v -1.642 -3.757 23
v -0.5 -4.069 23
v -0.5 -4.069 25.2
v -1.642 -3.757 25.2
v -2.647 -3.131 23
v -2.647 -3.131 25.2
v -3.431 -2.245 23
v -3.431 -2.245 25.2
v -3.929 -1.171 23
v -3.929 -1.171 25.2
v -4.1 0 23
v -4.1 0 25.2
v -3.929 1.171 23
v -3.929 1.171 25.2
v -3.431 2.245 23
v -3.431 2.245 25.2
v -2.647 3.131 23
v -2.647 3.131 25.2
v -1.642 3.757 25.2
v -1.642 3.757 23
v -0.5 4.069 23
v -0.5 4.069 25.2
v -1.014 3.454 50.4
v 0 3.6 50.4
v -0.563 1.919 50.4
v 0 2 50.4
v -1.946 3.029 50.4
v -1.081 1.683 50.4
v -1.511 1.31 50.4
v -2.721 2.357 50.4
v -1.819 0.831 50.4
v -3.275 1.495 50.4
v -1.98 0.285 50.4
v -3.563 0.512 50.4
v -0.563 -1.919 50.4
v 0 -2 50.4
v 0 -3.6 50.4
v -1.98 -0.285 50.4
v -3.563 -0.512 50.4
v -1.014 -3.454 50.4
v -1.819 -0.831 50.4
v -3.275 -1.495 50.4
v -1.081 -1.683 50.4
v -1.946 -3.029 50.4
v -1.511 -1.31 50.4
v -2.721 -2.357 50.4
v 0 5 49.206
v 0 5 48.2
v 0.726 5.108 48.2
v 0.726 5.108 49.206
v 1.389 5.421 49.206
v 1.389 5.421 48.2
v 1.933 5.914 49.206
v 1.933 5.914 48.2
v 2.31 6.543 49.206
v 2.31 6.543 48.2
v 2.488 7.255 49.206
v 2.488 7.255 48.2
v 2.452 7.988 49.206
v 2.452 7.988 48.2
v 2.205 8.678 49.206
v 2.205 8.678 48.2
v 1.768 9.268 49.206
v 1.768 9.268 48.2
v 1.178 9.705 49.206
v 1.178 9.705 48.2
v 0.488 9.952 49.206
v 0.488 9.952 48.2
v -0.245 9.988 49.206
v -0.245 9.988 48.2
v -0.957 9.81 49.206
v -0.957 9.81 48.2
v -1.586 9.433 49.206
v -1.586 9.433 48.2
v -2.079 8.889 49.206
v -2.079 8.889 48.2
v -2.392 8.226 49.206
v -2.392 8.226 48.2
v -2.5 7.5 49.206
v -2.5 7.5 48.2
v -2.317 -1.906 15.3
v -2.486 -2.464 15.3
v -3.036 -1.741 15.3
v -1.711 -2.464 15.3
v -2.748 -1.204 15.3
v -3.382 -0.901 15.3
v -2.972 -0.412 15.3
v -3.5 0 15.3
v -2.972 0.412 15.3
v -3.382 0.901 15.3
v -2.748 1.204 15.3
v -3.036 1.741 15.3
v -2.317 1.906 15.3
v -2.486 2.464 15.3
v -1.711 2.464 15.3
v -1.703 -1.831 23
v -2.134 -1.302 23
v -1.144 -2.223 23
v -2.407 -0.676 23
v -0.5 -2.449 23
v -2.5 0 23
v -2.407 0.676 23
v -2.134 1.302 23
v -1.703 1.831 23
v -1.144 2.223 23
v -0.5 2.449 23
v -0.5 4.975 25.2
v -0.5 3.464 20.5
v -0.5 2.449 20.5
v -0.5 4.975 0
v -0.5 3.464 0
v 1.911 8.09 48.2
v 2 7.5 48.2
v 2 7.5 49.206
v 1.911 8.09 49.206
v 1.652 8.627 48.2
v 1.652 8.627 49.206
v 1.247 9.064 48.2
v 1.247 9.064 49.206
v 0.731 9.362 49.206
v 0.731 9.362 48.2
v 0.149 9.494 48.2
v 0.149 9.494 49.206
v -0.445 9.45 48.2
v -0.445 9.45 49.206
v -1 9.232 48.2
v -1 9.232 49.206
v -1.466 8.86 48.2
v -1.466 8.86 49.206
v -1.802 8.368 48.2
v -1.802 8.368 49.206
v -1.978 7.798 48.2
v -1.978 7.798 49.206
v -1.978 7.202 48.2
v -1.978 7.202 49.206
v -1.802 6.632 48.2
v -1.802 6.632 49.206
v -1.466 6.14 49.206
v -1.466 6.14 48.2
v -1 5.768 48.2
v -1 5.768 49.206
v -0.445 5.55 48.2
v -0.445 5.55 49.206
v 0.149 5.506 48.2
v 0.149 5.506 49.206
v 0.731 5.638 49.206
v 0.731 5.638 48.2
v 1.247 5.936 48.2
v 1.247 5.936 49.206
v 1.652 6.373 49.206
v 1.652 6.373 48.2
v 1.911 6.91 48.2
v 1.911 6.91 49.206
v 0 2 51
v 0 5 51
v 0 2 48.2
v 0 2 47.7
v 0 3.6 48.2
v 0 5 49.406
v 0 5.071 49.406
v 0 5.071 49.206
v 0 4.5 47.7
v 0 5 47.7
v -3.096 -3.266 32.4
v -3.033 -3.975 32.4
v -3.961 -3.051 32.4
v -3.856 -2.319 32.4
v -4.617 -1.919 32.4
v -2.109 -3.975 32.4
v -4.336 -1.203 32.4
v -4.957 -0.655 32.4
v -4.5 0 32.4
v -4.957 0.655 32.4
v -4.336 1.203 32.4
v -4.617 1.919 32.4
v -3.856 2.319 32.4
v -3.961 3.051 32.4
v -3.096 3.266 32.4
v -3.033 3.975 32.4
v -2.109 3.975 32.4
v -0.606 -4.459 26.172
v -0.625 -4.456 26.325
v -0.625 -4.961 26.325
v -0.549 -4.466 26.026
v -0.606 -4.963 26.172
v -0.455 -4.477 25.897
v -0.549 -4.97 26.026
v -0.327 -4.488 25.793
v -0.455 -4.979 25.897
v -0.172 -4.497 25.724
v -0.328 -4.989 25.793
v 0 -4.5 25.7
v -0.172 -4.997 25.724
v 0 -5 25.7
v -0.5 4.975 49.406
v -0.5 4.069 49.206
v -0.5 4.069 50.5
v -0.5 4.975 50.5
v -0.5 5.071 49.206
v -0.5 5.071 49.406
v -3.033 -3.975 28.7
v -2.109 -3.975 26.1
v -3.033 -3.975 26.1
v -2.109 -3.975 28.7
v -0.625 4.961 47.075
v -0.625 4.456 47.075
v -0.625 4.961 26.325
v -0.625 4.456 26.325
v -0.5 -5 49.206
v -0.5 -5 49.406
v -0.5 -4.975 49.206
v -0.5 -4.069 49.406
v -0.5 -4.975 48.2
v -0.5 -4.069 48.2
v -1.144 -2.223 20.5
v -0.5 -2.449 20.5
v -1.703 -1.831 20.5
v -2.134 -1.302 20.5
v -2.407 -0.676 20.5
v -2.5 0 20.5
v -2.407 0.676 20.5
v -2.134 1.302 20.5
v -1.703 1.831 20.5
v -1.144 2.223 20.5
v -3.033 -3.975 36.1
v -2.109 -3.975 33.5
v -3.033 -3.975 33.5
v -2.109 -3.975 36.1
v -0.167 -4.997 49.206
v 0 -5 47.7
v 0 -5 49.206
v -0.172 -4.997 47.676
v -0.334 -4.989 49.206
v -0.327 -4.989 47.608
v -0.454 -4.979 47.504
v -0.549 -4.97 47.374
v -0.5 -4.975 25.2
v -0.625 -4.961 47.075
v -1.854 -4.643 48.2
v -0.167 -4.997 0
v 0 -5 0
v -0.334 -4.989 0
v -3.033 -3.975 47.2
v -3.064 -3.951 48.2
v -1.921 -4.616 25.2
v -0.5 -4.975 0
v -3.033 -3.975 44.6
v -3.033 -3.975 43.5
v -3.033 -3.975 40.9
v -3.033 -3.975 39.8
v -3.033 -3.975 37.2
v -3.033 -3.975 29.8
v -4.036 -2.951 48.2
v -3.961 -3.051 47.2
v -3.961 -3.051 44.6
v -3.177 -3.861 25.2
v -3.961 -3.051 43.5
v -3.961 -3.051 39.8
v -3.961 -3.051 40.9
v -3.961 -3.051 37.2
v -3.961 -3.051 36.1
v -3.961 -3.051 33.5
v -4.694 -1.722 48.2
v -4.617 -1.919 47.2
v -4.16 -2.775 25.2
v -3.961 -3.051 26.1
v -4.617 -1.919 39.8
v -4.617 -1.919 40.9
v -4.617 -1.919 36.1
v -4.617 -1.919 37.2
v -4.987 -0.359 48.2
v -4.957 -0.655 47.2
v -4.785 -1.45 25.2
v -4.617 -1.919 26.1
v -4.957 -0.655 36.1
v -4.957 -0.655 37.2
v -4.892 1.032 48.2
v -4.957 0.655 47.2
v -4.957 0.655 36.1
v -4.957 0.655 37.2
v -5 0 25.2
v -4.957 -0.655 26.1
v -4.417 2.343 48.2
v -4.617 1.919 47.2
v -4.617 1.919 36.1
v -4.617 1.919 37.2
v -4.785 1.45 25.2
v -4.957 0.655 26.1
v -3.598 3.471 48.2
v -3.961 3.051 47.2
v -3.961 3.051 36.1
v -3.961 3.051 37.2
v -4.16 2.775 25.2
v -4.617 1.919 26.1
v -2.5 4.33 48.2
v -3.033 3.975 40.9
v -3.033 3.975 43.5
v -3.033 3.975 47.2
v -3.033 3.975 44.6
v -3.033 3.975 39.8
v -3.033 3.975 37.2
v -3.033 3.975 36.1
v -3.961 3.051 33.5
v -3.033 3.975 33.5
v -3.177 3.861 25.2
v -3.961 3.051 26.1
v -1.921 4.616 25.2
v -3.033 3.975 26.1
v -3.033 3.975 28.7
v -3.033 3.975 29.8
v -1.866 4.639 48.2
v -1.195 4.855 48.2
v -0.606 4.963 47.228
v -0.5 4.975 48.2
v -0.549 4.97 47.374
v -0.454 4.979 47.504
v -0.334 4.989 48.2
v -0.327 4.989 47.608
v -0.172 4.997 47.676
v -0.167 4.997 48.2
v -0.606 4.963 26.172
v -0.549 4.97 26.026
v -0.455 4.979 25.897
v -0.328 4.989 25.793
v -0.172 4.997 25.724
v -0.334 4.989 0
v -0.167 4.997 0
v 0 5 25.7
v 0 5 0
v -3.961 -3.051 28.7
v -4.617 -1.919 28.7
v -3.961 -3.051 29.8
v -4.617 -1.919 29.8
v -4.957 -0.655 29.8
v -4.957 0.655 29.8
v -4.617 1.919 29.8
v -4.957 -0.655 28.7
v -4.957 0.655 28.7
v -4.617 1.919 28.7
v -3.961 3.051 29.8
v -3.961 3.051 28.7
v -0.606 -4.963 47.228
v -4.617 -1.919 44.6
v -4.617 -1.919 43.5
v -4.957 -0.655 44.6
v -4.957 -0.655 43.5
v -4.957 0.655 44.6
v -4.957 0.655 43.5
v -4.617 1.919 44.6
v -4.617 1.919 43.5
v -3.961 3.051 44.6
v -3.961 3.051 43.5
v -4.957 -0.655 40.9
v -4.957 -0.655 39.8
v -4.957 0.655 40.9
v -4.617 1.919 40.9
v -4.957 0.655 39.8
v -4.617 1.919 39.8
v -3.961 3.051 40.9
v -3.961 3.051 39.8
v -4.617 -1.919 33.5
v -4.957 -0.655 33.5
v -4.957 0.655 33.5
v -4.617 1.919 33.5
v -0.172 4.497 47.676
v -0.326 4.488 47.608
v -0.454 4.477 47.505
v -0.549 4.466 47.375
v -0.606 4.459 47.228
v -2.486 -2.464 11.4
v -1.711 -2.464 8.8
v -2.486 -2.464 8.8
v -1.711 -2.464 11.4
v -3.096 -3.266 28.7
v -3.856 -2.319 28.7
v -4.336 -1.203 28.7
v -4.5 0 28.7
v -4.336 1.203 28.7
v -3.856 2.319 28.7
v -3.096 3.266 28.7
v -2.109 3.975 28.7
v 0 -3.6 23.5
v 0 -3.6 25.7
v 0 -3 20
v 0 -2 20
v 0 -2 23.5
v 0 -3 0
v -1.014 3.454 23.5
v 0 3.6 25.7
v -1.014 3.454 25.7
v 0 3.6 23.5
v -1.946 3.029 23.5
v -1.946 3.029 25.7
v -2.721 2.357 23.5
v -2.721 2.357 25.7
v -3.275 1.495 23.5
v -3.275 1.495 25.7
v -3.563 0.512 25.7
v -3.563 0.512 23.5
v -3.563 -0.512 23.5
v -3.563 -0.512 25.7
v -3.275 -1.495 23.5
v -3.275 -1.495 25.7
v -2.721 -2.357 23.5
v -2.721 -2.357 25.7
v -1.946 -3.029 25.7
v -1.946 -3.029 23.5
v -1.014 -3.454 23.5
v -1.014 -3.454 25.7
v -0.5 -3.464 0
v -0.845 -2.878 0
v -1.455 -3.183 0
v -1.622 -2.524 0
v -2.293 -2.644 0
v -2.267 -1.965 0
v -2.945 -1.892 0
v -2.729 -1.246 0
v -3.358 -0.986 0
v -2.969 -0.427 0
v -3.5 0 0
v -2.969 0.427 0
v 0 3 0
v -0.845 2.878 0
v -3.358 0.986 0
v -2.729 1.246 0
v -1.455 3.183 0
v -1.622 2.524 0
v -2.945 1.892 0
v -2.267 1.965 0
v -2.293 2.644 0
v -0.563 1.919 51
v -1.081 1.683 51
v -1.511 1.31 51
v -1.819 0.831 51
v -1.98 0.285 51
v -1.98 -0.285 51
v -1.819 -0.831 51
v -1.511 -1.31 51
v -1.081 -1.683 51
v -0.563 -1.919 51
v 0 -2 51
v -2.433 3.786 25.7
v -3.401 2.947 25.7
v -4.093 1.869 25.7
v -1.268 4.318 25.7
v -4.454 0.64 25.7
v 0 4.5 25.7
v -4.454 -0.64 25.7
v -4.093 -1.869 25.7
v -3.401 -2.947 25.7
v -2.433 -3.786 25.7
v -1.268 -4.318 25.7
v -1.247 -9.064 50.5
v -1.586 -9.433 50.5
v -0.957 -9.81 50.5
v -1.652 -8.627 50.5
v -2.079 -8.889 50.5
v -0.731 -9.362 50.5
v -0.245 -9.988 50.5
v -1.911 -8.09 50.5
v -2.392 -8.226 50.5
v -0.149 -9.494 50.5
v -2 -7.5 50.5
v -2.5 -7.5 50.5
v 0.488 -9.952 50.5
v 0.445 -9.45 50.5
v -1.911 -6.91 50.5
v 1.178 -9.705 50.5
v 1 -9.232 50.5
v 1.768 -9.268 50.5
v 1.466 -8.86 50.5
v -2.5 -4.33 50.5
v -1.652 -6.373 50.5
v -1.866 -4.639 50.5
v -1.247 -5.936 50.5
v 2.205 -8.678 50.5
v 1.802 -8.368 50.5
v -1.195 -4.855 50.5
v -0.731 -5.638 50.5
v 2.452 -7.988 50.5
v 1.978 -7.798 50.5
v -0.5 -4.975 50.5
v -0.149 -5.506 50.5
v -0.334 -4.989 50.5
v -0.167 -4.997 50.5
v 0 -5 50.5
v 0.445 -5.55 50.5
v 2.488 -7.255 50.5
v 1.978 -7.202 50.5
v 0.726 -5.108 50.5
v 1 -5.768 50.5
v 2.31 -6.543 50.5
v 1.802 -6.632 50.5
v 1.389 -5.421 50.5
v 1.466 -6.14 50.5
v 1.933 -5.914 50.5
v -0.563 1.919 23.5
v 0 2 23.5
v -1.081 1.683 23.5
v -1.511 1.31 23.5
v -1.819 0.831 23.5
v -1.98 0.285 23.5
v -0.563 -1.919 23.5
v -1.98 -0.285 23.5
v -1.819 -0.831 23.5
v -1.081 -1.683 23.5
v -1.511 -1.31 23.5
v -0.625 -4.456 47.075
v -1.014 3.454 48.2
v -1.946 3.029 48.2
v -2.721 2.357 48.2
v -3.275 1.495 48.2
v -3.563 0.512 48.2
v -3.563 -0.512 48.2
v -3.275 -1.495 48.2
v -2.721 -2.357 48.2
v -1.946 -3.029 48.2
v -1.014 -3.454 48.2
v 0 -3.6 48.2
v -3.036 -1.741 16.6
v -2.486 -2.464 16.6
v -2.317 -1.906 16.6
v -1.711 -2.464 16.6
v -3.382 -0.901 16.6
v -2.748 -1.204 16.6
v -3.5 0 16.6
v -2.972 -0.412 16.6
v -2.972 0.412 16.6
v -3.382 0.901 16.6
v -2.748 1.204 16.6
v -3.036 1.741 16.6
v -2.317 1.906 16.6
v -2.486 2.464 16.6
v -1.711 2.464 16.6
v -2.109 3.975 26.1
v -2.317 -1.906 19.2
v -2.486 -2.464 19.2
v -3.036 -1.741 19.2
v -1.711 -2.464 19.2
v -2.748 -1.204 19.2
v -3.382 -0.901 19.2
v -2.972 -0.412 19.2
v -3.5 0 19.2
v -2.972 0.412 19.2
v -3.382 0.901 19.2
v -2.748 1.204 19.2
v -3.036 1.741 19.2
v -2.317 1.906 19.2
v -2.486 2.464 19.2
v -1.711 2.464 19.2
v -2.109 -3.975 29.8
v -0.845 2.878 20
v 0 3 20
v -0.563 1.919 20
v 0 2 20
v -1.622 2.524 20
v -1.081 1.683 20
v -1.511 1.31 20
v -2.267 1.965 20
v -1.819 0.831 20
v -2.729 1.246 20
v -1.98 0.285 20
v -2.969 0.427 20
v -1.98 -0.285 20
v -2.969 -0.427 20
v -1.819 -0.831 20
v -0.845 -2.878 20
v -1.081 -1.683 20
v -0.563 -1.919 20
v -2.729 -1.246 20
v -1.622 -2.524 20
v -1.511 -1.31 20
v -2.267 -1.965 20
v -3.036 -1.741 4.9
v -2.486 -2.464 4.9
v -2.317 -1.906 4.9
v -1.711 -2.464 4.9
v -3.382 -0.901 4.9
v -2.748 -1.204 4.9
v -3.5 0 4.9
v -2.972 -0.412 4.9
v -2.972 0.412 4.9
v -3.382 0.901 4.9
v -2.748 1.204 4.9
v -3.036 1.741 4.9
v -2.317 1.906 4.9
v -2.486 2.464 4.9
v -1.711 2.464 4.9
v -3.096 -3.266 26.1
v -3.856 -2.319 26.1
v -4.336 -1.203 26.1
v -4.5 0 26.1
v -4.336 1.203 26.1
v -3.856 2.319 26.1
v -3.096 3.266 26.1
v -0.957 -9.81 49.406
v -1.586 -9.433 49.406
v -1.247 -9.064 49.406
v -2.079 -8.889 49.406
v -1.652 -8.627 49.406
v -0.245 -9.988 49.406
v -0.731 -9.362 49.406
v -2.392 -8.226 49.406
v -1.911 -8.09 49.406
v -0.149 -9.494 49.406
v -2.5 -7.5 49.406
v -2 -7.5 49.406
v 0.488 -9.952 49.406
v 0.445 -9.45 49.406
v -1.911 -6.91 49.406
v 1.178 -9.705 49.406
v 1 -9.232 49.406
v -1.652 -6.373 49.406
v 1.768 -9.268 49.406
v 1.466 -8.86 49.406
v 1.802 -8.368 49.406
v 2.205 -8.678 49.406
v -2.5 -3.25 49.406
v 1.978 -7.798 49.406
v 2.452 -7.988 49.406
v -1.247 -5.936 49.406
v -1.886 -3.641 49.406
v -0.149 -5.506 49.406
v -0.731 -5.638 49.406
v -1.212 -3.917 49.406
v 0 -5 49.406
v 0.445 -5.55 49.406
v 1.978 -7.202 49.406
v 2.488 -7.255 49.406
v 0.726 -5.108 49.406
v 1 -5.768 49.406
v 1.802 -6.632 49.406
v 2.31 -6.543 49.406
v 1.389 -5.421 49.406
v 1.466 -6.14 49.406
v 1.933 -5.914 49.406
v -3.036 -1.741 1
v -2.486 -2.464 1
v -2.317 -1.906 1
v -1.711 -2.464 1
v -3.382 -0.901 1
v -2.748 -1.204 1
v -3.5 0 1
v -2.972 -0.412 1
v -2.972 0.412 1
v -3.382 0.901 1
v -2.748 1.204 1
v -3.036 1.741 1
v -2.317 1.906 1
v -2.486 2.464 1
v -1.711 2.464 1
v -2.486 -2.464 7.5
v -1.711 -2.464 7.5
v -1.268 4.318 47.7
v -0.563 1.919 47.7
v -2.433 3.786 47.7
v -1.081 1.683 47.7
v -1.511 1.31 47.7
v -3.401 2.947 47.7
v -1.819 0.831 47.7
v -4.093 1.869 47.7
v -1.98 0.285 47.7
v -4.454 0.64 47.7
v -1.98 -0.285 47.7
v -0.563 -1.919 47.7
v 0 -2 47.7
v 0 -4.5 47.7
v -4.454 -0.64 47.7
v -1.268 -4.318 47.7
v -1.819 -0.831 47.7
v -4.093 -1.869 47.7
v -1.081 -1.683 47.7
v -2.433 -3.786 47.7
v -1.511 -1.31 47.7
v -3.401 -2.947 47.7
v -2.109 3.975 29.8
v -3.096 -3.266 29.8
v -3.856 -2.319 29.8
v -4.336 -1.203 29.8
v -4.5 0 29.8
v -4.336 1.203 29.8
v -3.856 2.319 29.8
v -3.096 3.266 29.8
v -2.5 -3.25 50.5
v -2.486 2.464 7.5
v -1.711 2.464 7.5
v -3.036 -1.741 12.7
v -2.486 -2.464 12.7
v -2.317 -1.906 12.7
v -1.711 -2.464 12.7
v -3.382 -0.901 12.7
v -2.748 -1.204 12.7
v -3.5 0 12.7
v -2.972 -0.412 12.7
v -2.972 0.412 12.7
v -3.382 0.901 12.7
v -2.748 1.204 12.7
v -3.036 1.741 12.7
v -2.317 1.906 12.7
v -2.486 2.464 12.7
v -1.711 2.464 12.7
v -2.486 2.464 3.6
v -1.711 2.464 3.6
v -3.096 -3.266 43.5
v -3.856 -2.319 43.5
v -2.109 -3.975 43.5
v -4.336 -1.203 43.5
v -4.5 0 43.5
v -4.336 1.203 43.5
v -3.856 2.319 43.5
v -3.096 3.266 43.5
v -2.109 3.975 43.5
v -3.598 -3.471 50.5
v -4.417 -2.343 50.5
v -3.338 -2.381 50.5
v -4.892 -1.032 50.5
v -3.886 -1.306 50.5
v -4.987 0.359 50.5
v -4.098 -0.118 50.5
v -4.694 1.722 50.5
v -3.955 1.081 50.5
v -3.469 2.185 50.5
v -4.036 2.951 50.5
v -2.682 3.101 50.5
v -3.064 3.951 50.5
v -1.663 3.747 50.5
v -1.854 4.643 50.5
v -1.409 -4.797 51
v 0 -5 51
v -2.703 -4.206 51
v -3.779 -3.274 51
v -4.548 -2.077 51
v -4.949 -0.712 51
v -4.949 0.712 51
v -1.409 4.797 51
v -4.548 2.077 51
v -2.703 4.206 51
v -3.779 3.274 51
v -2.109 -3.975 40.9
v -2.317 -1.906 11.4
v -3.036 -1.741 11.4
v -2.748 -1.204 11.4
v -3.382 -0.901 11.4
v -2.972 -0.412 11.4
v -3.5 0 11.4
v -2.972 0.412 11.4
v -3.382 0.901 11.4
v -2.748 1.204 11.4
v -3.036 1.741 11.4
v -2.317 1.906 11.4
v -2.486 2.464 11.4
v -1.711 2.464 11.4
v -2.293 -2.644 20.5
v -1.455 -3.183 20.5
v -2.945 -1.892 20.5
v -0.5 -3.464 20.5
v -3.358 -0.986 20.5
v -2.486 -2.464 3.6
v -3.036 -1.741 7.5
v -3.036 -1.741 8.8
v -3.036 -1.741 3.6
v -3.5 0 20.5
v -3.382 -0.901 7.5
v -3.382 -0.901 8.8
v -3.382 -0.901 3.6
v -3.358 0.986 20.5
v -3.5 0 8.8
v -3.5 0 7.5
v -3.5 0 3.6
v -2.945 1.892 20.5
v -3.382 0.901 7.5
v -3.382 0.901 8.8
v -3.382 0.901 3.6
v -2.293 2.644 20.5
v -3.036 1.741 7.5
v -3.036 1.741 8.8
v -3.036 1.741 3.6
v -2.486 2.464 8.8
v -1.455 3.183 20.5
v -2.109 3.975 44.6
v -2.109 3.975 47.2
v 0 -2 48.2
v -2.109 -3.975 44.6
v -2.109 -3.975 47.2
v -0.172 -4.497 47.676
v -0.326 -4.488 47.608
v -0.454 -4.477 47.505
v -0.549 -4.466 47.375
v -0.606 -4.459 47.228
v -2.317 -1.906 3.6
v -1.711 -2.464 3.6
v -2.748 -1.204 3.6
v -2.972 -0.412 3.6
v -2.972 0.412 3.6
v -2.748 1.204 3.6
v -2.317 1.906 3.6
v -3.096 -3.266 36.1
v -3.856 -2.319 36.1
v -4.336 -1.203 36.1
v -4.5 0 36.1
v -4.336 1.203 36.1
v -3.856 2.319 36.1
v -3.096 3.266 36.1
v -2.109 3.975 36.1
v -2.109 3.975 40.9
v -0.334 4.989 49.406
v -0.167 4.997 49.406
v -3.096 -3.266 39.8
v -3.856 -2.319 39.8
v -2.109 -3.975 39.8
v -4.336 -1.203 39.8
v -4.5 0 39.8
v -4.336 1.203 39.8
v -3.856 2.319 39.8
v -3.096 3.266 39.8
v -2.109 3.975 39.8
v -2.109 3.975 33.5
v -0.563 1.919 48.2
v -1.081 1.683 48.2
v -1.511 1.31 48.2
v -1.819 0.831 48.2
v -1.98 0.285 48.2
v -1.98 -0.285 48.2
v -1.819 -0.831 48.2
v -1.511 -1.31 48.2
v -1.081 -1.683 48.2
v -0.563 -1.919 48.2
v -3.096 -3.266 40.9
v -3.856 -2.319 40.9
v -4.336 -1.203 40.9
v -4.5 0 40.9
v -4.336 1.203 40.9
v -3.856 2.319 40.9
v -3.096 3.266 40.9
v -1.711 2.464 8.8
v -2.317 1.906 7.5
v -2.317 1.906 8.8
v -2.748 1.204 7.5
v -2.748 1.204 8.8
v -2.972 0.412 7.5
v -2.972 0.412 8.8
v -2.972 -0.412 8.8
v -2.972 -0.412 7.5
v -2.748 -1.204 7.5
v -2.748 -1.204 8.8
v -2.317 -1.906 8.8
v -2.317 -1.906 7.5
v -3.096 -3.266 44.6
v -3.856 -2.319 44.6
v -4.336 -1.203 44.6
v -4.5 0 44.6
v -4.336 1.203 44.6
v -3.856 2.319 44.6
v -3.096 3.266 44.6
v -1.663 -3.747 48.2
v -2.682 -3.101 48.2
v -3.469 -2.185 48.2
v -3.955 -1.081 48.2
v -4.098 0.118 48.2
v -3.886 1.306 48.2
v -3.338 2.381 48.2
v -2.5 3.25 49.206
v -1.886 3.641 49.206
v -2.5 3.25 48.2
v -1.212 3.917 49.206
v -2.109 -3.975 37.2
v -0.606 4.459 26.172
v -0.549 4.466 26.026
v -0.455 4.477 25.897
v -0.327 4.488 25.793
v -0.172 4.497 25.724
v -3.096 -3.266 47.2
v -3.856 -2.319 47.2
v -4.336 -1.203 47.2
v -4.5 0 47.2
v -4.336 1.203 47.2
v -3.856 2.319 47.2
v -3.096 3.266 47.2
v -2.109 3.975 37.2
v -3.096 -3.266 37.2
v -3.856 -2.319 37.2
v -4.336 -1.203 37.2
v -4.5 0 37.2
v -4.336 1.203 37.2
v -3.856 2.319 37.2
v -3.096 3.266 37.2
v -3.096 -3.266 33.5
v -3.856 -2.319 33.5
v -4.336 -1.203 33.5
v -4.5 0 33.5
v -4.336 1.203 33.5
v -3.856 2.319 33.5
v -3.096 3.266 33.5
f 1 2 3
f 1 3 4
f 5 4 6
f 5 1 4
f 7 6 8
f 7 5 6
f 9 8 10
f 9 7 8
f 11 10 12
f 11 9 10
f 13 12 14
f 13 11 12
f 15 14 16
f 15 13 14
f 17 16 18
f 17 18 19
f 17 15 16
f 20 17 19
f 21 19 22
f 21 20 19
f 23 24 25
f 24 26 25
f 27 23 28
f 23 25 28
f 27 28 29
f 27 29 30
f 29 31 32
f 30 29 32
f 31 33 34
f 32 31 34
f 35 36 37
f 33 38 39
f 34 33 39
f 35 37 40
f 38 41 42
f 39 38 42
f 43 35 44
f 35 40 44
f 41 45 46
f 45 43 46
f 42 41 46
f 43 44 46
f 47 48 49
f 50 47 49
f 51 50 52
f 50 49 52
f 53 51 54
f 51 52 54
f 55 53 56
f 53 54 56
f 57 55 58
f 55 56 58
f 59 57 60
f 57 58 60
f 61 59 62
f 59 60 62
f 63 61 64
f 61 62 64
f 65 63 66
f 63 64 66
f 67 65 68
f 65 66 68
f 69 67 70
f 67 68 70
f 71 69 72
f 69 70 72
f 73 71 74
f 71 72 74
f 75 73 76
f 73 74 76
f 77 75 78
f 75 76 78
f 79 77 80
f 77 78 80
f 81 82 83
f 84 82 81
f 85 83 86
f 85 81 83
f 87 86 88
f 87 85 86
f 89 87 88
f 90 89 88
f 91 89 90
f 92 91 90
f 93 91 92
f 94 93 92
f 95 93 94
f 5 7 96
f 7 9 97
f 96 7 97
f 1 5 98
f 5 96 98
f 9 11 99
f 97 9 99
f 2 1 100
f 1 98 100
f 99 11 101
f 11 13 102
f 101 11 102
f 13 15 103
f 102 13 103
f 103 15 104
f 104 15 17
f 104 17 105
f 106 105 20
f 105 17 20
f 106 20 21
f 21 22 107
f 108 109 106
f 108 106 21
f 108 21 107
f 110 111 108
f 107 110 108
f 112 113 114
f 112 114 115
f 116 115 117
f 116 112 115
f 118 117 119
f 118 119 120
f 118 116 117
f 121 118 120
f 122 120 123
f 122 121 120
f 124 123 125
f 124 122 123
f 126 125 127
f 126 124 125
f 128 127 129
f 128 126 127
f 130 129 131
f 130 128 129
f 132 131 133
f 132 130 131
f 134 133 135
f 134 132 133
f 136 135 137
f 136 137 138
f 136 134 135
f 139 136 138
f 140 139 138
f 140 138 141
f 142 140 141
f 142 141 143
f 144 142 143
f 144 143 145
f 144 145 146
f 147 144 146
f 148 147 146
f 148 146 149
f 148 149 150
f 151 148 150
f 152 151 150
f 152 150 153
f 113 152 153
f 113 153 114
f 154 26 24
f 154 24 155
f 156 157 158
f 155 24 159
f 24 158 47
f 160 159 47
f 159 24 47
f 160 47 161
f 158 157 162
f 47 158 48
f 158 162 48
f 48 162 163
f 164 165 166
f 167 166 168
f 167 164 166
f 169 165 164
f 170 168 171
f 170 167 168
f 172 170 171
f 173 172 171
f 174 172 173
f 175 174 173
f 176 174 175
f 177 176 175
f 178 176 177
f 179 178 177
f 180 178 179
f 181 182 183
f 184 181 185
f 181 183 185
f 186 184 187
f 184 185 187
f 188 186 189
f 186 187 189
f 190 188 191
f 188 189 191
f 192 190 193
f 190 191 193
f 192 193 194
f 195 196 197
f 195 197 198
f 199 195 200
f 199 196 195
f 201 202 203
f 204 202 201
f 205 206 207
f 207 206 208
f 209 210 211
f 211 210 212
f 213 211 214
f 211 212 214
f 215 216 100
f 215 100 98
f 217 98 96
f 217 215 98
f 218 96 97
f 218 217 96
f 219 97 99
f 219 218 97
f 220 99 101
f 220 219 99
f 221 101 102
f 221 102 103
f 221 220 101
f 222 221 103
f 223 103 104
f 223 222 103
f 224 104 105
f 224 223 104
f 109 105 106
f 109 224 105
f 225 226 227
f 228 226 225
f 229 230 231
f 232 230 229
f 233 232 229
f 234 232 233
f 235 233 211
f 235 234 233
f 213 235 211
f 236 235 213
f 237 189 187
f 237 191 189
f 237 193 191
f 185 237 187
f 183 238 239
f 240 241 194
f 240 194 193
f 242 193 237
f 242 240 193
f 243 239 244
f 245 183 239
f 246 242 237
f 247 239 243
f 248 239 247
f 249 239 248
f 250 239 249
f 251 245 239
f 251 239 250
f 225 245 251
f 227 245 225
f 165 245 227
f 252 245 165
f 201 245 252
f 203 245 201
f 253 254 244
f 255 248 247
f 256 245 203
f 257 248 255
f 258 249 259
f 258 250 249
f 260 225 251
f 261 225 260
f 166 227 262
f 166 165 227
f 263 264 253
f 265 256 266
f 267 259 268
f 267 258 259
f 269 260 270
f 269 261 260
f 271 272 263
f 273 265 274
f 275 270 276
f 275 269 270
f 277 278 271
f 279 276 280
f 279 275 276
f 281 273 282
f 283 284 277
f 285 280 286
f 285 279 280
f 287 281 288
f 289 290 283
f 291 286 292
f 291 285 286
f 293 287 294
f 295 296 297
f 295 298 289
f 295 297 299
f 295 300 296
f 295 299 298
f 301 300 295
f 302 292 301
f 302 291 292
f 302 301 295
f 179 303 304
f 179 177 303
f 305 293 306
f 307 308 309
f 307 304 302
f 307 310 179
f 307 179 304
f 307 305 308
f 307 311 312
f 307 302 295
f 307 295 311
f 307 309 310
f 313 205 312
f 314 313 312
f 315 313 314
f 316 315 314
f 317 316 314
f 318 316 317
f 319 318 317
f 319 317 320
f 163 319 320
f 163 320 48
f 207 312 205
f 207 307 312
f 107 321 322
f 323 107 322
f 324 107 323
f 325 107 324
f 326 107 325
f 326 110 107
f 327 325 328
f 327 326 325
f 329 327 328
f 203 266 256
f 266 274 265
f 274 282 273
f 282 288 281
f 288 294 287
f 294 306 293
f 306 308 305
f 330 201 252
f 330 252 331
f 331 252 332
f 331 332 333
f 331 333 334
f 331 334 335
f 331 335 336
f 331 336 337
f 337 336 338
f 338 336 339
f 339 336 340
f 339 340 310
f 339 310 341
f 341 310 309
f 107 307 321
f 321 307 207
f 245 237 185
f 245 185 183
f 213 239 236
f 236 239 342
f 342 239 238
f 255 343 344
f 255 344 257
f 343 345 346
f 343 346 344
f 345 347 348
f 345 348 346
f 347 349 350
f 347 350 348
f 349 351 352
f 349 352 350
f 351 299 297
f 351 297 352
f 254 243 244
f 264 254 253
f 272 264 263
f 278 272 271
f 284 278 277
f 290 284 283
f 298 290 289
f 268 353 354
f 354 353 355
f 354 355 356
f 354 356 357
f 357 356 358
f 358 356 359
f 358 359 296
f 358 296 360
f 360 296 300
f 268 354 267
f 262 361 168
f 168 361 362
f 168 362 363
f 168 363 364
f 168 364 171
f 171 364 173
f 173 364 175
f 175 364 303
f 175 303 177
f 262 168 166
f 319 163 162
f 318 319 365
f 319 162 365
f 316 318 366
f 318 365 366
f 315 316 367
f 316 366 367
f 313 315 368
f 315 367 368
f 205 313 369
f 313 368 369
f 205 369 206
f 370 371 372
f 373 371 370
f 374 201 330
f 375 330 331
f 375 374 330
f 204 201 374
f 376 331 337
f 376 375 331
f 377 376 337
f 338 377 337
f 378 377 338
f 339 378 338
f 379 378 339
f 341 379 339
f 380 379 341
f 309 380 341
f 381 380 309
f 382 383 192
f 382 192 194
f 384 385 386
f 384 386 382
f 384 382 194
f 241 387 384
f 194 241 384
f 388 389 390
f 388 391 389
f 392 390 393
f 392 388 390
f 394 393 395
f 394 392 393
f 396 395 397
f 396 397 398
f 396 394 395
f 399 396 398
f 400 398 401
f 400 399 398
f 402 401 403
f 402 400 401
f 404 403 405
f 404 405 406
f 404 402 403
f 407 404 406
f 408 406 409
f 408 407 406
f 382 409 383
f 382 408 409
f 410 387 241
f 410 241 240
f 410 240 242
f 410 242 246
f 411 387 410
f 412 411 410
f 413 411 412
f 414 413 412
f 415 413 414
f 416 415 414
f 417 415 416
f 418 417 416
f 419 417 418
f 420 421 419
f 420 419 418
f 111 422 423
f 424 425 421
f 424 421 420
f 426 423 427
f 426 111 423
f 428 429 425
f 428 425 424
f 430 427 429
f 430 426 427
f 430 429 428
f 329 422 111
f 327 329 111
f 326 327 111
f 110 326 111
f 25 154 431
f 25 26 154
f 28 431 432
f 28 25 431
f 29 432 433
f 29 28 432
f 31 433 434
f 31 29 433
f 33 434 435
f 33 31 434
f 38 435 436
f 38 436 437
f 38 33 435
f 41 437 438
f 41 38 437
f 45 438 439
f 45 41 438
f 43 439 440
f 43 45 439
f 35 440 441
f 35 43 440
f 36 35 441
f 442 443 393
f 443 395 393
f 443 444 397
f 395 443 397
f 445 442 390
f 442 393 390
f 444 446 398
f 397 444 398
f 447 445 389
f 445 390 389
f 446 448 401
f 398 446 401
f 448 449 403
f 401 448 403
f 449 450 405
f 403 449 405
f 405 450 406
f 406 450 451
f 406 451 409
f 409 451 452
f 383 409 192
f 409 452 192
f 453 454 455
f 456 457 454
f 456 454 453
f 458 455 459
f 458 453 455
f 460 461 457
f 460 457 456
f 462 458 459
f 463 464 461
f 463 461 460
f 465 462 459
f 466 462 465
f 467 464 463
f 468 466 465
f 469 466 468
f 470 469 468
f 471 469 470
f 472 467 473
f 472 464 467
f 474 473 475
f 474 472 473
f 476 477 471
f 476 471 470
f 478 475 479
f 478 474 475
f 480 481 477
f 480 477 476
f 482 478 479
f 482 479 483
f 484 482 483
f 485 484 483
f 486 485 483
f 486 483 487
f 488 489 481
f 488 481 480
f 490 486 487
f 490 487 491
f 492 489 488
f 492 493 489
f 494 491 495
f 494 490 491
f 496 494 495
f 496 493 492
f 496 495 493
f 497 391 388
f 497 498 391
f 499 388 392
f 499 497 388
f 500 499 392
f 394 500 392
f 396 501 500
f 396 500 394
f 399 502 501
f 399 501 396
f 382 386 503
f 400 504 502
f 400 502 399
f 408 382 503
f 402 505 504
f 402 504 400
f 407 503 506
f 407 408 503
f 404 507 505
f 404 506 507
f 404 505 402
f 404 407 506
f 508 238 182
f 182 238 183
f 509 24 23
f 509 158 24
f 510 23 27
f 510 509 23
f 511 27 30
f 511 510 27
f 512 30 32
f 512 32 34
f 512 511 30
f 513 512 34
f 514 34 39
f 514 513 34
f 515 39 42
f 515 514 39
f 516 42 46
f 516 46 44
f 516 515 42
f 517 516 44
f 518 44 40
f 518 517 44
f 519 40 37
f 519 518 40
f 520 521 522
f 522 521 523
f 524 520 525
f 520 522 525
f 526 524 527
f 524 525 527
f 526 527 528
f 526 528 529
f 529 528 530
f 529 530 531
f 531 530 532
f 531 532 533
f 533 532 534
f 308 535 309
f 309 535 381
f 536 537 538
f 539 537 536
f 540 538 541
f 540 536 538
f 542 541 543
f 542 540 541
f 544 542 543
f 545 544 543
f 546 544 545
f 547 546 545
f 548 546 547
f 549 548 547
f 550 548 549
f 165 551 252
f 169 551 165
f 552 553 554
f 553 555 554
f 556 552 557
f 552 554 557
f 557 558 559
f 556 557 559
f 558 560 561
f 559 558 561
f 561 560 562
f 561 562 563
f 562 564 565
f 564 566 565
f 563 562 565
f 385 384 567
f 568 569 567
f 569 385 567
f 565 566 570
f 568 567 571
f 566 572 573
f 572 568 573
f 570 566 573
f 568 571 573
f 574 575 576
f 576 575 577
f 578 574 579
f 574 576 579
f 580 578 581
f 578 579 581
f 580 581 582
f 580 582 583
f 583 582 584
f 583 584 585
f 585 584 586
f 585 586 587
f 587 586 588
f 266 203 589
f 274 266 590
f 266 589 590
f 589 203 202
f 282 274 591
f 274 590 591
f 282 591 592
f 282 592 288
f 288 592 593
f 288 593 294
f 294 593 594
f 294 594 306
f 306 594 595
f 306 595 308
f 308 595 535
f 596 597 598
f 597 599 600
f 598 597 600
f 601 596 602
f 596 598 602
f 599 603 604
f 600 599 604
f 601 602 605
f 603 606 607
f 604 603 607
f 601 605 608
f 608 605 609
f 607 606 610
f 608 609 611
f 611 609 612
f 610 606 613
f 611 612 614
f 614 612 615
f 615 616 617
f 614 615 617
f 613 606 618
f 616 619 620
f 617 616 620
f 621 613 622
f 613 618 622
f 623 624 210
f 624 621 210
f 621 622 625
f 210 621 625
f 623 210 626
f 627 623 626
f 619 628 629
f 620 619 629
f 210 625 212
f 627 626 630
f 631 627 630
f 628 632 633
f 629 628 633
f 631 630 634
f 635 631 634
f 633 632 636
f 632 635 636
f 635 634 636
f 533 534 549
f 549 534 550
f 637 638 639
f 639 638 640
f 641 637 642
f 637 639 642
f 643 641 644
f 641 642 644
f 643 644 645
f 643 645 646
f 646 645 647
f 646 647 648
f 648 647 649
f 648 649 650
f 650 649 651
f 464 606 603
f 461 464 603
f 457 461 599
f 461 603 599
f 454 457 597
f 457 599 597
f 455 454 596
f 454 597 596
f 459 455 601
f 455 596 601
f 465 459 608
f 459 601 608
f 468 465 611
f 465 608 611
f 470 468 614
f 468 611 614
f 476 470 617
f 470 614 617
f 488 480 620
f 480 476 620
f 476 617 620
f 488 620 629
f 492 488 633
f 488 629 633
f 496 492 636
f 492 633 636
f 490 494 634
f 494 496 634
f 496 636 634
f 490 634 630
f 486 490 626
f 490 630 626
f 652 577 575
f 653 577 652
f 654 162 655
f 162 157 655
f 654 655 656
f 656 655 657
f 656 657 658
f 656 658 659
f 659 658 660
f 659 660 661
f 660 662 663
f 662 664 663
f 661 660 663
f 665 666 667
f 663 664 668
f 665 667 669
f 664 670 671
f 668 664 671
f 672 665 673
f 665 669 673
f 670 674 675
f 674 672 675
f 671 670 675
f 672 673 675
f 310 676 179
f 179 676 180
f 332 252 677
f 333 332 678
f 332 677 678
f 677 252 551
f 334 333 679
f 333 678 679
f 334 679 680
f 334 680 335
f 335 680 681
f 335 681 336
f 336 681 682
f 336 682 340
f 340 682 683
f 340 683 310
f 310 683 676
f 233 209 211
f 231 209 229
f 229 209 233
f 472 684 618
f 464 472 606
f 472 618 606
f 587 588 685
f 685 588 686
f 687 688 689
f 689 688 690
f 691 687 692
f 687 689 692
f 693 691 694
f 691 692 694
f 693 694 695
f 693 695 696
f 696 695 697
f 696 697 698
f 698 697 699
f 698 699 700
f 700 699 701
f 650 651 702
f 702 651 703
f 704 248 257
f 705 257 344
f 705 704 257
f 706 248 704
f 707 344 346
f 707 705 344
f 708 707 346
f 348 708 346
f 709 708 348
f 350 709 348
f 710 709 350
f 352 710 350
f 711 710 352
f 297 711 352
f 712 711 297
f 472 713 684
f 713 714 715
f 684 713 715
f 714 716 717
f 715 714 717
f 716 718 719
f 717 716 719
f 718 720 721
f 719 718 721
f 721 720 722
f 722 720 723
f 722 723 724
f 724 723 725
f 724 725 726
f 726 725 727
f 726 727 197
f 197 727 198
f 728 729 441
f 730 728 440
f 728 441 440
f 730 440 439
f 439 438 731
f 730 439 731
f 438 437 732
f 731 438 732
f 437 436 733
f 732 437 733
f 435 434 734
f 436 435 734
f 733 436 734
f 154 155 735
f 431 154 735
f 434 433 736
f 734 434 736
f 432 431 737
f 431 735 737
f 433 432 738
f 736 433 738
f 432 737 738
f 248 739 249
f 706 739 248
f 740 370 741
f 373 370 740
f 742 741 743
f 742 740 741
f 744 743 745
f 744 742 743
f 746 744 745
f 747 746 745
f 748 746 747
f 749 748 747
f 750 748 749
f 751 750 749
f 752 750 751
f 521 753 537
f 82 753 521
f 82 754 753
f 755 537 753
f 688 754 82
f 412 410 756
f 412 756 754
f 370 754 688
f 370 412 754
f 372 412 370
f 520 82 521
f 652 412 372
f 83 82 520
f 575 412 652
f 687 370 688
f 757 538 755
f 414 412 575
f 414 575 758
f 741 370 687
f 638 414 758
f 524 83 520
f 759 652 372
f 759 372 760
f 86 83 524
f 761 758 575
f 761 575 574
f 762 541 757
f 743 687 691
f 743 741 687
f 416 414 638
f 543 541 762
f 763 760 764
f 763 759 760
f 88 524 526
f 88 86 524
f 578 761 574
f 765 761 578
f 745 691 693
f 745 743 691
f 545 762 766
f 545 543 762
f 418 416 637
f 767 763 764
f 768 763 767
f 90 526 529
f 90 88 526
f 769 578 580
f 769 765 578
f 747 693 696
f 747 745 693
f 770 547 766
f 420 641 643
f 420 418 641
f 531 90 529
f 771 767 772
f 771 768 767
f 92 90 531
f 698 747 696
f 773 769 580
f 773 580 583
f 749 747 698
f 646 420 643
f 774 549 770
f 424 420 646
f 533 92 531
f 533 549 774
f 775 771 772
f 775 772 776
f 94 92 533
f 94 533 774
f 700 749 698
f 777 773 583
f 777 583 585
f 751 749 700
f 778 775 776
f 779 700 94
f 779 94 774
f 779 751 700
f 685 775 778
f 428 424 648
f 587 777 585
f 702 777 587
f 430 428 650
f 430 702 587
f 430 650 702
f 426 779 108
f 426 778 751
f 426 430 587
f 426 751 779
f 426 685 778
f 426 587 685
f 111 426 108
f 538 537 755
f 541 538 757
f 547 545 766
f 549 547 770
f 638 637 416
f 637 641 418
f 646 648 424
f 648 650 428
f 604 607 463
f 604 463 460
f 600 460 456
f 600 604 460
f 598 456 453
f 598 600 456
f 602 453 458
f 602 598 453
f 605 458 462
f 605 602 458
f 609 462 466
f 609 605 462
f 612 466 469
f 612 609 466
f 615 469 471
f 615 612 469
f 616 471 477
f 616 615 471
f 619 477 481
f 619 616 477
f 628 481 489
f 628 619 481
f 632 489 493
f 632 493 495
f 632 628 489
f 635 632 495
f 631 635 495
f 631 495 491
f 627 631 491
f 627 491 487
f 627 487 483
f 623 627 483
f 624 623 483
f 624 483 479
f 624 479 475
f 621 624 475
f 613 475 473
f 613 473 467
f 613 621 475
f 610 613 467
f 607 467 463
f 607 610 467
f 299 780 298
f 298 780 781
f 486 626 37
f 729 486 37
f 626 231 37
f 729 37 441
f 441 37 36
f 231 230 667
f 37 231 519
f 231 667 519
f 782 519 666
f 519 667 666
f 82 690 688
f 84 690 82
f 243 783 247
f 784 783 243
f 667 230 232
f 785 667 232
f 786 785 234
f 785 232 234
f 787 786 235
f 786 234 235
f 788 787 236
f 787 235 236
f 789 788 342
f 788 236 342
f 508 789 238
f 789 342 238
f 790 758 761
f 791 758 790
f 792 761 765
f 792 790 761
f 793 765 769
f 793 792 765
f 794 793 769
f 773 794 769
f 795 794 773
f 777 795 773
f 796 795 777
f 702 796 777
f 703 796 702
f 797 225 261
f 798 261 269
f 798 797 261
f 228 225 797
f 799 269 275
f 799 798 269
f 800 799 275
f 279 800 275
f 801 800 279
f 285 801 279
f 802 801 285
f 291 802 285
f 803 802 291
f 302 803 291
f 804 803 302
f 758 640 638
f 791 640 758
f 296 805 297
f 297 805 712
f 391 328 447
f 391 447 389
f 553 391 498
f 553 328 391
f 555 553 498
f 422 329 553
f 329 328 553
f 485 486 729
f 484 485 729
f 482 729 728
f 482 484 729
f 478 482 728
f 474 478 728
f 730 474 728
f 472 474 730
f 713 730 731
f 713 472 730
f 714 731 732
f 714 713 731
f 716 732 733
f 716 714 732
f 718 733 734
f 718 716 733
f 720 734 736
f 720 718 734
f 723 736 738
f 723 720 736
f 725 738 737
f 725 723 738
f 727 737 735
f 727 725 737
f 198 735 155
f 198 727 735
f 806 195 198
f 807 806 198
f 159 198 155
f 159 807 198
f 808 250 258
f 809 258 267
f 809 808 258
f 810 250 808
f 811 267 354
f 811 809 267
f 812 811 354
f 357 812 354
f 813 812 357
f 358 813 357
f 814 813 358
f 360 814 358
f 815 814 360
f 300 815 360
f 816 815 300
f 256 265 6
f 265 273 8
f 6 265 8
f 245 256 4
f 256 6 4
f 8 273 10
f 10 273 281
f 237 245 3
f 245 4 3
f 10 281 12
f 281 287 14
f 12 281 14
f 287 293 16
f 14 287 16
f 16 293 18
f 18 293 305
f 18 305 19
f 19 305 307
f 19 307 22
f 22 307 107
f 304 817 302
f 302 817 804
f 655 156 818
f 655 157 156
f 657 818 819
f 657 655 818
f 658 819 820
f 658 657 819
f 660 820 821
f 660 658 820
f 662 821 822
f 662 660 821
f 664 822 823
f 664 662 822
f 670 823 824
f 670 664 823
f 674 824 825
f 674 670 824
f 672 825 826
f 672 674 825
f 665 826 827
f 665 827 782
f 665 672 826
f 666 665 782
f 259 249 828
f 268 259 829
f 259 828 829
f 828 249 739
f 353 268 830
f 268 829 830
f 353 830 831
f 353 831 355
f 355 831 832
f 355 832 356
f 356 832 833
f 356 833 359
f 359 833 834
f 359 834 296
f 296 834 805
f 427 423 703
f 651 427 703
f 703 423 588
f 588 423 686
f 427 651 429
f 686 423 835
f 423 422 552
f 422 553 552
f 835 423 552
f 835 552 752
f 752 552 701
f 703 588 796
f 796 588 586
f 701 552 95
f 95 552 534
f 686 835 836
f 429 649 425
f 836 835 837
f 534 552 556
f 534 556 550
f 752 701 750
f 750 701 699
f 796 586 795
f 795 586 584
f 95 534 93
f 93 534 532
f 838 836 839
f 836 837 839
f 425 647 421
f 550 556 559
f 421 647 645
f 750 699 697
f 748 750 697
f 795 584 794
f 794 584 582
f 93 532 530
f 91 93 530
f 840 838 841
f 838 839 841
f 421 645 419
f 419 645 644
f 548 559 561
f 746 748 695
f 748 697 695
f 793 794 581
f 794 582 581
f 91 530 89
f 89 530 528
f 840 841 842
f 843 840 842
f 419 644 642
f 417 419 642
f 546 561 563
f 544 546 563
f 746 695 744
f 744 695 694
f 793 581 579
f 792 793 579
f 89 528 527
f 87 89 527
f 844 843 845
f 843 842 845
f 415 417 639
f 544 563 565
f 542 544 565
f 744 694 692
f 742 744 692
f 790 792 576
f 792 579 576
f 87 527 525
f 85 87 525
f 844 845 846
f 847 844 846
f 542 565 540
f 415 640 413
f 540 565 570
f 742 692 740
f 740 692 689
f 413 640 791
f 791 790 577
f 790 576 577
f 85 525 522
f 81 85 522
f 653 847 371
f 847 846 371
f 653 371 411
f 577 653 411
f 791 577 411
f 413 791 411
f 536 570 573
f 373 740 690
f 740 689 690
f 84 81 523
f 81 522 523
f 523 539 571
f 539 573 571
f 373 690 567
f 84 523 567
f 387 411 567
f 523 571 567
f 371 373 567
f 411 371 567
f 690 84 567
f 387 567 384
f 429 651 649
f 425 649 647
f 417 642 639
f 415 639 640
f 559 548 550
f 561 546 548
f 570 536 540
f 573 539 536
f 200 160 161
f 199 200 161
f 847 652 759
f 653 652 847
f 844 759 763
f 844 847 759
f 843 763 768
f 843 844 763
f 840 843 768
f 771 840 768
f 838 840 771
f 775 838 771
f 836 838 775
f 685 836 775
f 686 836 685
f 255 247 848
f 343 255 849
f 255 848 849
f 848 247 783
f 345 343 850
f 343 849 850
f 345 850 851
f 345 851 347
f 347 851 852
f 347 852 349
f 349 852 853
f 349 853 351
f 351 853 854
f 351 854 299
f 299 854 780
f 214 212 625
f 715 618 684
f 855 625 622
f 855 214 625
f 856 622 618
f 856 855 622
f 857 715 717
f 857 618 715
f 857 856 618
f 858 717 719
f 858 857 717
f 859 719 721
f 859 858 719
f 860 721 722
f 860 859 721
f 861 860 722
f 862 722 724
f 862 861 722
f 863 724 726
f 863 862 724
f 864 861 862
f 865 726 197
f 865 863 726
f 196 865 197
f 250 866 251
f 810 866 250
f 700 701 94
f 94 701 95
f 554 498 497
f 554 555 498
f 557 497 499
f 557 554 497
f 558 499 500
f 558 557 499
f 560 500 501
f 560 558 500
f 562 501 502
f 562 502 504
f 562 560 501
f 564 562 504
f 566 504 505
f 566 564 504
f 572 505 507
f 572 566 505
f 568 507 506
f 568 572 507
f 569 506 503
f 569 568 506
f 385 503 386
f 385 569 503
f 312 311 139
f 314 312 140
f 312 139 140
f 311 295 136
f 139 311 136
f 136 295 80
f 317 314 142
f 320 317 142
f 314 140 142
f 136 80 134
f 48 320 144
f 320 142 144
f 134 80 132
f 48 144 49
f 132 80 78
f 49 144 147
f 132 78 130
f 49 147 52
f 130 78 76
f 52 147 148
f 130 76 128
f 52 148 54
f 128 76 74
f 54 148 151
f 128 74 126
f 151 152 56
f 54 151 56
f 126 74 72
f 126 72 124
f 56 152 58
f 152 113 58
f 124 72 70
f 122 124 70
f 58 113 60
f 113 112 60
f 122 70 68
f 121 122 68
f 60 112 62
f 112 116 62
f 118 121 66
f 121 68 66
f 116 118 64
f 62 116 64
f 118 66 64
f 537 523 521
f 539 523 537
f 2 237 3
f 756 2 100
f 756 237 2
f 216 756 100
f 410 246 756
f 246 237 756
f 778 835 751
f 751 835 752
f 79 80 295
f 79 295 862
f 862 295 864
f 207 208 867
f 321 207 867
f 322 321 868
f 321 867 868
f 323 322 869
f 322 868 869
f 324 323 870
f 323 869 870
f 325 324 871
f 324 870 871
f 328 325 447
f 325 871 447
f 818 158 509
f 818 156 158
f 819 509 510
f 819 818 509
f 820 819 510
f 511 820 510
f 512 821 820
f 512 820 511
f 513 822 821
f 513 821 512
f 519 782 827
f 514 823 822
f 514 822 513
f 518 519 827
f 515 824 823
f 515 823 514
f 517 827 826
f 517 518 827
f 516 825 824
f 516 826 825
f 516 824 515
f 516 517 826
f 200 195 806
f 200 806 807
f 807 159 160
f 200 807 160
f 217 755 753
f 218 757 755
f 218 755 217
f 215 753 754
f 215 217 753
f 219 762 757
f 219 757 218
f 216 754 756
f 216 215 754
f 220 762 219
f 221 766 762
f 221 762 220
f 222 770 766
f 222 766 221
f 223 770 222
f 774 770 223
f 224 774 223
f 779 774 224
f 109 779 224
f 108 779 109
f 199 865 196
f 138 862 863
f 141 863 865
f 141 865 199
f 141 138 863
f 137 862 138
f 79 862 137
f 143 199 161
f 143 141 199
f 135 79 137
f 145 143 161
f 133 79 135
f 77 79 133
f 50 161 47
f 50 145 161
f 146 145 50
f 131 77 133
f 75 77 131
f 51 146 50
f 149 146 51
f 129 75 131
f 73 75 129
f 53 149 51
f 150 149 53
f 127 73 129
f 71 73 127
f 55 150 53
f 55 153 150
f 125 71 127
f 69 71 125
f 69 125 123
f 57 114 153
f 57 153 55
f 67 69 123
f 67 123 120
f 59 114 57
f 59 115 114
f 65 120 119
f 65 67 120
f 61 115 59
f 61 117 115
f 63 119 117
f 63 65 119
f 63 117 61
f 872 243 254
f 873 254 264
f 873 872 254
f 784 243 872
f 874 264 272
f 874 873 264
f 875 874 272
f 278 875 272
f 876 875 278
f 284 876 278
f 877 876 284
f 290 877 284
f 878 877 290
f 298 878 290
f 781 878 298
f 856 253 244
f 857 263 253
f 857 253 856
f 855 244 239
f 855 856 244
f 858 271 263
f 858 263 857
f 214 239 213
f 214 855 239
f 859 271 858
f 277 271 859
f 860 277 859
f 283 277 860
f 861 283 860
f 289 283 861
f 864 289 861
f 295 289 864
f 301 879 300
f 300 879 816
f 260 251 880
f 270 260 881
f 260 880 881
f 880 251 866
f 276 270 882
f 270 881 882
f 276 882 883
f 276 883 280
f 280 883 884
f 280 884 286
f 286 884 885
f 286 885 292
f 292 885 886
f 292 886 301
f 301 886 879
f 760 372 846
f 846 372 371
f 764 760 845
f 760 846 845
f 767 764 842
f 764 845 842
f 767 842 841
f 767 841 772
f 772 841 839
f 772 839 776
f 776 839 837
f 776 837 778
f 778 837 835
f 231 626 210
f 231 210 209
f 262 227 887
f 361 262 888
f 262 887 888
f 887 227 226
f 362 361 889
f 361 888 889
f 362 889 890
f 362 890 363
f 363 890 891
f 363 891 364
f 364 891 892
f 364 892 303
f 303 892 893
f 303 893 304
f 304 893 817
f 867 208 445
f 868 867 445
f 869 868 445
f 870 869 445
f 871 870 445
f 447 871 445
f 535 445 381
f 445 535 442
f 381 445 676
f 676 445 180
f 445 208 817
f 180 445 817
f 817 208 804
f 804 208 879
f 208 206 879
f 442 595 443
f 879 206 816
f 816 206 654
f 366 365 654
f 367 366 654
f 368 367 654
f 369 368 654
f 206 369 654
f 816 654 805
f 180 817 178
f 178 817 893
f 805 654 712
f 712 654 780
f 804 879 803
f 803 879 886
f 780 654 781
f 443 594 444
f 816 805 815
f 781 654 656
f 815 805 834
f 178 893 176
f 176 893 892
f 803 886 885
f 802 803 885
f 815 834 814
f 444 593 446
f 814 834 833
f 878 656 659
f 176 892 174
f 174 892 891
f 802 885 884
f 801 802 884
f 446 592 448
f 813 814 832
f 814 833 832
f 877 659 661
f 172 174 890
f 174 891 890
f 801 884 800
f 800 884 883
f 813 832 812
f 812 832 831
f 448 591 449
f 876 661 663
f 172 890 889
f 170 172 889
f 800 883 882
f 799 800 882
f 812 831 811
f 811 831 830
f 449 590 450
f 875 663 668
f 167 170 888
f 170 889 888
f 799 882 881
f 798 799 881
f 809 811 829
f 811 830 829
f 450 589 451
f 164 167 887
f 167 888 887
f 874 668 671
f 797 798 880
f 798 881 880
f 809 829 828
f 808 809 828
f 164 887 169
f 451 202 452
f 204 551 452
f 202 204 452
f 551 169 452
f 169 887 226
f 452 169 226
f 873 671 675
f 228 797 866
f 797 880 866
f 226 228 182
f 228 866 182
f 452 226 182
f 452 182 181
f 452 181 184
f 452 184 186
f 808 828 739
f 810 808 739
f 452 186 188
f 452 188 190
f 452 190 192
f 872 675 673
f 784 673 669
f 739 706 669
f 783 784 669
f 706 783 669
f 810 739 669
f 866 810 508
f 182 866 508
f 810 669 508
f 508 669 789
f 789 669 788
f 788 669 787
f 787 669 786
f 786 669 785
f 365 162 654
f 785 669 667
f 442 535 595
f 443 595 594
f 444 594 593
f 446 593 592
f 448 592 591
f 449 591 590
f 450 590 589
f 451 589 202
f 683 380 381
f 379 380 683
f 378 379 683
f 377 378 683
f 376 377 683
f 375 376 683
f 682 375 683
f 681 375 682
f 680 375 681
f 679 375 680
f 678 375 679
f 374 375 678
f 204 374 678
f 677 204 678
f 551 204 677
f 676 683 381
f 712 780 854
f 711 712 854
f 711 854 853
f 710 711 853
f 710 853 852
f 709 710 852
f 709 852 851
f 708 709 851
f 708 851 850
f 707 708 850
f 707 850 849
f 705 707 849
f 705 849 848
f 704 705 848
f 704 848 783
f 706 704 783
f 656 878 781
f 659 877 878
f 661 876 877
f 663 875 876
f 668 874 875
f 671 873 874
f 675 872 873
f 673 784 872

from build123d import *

# Parameters (mm, degrees)
BOSS_EXTRUDE2_DEPTH     = 51
SKETCH4_W               = 2
SKETCH4_H               = 3.5
SKETCH4_W_2             = 1.6
SKETCH4_H_2             = 2.2
SKETCH4_H_3             = 22
SKETCH4_H_4             = 0.5
SKETCH4_H_5             = 0.6
CUT_EXTRUDE1_DEPTH      = 52.487862647
CUT_EXTRUDE1_DEPTH_BACK = 52.487862647
SHELL1_DEPTH            = 23
SHELL1_START            = 48.2
SHELL1_2_DEPTH          = 2.3
SHELL1_START_2          = 23
SHELL1_3_DEPTH          = 2.2
SHELL1_START_3          = 20.5
SHELL1_4_DEPTH          = 2.5
CUT_EXTRUDE2_DEPTH      = 52.487862766
CUT_EXTRUDE2_DEPTH_BACK = 52.487862766
SKETCH11_3_W            = 2.6
SKETCH11_3_H            = 7.949874372
SKETCH11_3_H_2          = 4.92820323
BOSS_EXTRUDE3_START     = -1.206049
SKETCH13_R              = 2.5
SKETCH13_R_2            = 2
BOSS_EXTRUDE3_DEPTH     = 1.206049
SKETCH13_3_R            = 2.5
SKETCH13_3_R_2          = 2
BOSS_EXTRUDE4_DEPTH     = 1.093951
CUT_EXTRUDE3_START      = -0.2
SKETCH13_6_R            = 2.5
SKETCH13_6_R_2          = 2
CUT_EXTRUDE3_DEPTH      = 0.2
CUT_EXTRUDE4_START      = -0.2
SKETCH13_7_R            = 2.5
SKETCH13_7_R_2          = 2
CUT_EXTRUDE4_DEPTH      = 0.2
SKETCH16_W              = 0.218836676
SKETCH16_H              = 0.970663166
SKETCH16_W_2            = 0.2
SKETCH16_H_2            = 1.122183611
BOSS_EXTRUDE10_DEPTH    = 0.5


# Read off the part's stored shape, not the designer's step: Shell1
with BuildPart() as part:
    # Sketch1 → Boss-Extrude2 (new body)
    with BuildSketch(Plane.XY):
        with BuildLine():
            Line((0, 5), (0, -5))
            ThreePointArc((0, -5), (-5, 0), (0, 5))
        make_face()
    extrude(amount=BOSS_EXTRUDE2_DEPTH)

    # Sketch4 → Cut-Revolve1 (revolve, cut)
    with BuildSketch(Plane(origin=(0, 0, 0), x_dir=(1, 0, 0), z_dir=(0, 1, 0))):
        Polygon((-3, 0), (-3, -20), (-2, -20), (0, -20), (0, 0), align=None)
        with Locations((-1, -21.75)):
            Rectangle(SKETCH4_W, SKETCH4_H)
        with Locations((-2.8, -24.6)):
            Rectangle(SKETCH4_W_2, SKETCH4_H_2)
        with Locations((-1, -24.6)):
            Rectangle(SKETCH4_W, SKETCH4_H_2)
        Polygon((-2, -47.7), (-2, -25.7), (-3.6, -25.7), (-4.5, -25.7), (-4.5, -47.7), align=None)
        with Locations((-1, -36.7)):
            Rectangle(SKETCH4_W, SKETCH4_H_3)
        with Locations((-1, -47.95)):
            Rectangle(SKETCH4_W, SKETCH4_H_4)
        with Locations((-2.8, -49.3)):
            Rectangle(SKETCH4_W_2, SKETCH4_H_2)
        with Locations((-1, -49.3)):
            Rectangle(SKETCH4_W, SKETCH4_H_2)
        with Locations((-1, -50.7)):
            Rectangle(SKETCH4_W, SKETCH4_H_5)
    revolve(axis=Axis((0, 0, 0), (0, 0, 1)), mode=Mode.SUBTRACT)

    # Sketch5 → Cut-Extrude1 (cut, two sides: drawn at the far end of the back side and taken through both)
    with BuildSketch(Plane(origin=(0, 0, 0), x_dir=(1, 0, 0), z_dir=(0, 1, 0)).offset(-CUT_EXTRUDE1_DEPTH_BACK)):
        with BuildLine():
            Line((0.625, -26.325), (0.625, -47.075))
            ThreePointArc((0.625, -47.075), (0, -47.7), (-0.625, -47.075))
            Line((-0.625, -47.075), (-0.625, -26.325))
            ThreePointArc((-0.625, -26.325), (0, -25.7), (0.625, -26.325))
        make_face()
    extrude(amount=CUT_EXTRUDE1_DEPTH + CUT_EXTRUDE1_DEPTH_BACK, mode=Mode.SUBTRACT)

    # Shell1 outline → Shell1 (cut)
    with BuildSketch(Plane.XY):
        with BuildLine():
            ThreePointArc((-0.5, -3.464101615), (-3.5, 0), (-0.5, 3.464101615))
            Line((-0.5, 3.464101615), (-0.5, 4.974937186))
            ThreePointArc((-0.5, 4.974937186), (-5, 0), (-0.5, -4.974937186))
            Line((-0.5, -4.974937186), (-0.5, -3.464101615))
        make_face()
    extrude(amount=SHELL1_DEPTH, mode=Mode.SUBTRACT)

    # Shell1 2 outline → Shell1 2 (cut)
    with BuildSketch(Plane.XY.offset(SHELL1_START)):
        with BuildLine():
            Line((-0.5, -4.974937186), (-0.5, -4.06939799))
            ThreePointArc((-0.5, -4.06939799), (-4.1, 0), (-0.5, 4.06939799))
            Line((-0.5, 4.06939799), (-0.5, 4.974937186))
            ThreePointArc((-0.5, 4.974937186), (-5, 0), (-0.5, -4.974937186))
        make_face()
    extrude(amount=SHELL1_2_DEPTH, mode=Mode.SUBTRACT)

    # Shell1 3 outline → Shell1 3 (cut)
    with BuildSketch(Plane.XY.offset(SHELL1_START_2)):
        with BuildLine():
            Line((-0.5, -4.974937186), (-0.5, -4.06939799))
            ThreePointArc((-0.5, -4.06939799), (-4.1, 0), (-0.5, 4.06939799))
            Line((-0.5, 4.06939799), (-0.5, 4.974937186))
            ThreePointArc((-0.5, 4.974937186), (-5, 0), (-0.5, -4.974937186))
        make_face()
    extrude(amount=SHELL1_3_DEPTH, mode=Mode.SUBTRACT)

    # Shell1 4 outline → Shell1 4 (cut)
    with BuildSketch(Plane.XY.offset(SHELL1_START_3)):
        with BuildLine():
            Line((-0.5, -3.464101615), (-0.5, -2.449489743))
            ThreePointArc((-0.5, -2.449489743), (-2.5, 0), (-0.5, 2.449489743))
            Line((-0.5, 2.449489743), (-0.5, 3.464101615))
            ThreePointArc((-0.5, 3.464101615), (-3.5, 0), (-0.5, -3.464101615))
        make_face()
    extrude(amount=SHELL1_4_DEPTH, mode=Mode.SUBTRACT)

    # Sketch11<3> → Cut-Extrude2 (cut, two sides: drawn at the far end of the back side and taken through both)
    with BuildSketch(Plane.ZY.offset(5).offset(-CUT_EXTRUDE2_DEPTH_BACK)):
        with Locations((27.4, 0)):
            Rectangle(SKETCH11_3_W, SKETCH11_3_H)
        with Locations((34.8, 0)):
            Rectangle(SKETCH11_3_W, SKETCH11_3_H)
        with Locations((38.5, 0)):
            Rectangle(SKETCH11_3_W, SKETCH11_3_H)
        with Locations((42.2, 0)):
            Rectangle(SKETCH11_3_W, SKETCH11_3_H)
        with Locations((45.9, 0)):
            Rectangle(SKETCH11_3_W, SKETCH11_3_H)
        with Locations((2.3, 0)):
            Rectangle(SKETCH11_3_W, SKETCH11_3_H_2)
        with Locations((6.2, 0)):
            Rectangle(SKETCH11_3_W, SKETCH11_3_H_2)
        with Locations((10.1, 0)):
            Rectangle(SKETCH11_3_W, SKETCH11_3_H_2)
        with Locations((14, 0)):
            Rectangle(SKETCH11_3_W, SKETCH11_3_H_2)
        with Locations((17.9, 0)):
            Rectangle(SKETCH11_3_W, SKETCH11_3_H_2)
        with Locations((31.1, 0)):
            Rectangle(SKETCH11_3_W, SKETCH11_3_H)
    extrude(amount=CUT_EXTRUDE2_DEPTH + CUT_EXTRUDE2_DEPTH_BACK, mode=Mode.SUBTRACT)

    # Sketch13 → Boss-Extrude3 (add)
    # profile 1 of 2: a face of its own
    with BuildSketch(Plane.XY.offset(49.40604876).offset(BOSS_EXTRUDE3_START)):
        with Locations((0, 7.5)):
            Circle(SKETCH13_R)
        with Locations((0, 7.5)):
            Circle(SKETCH13_R_2, mode=Mode.SUBTRACT)
    # profile 2 of 2: a face of its own
    with BuildSketch(Plane.XY.offset(49.40604876).offset(BOSS_EXTRUDE3_START)):
        with BuildLine():
            Line((0, 4.1), (0, 5))
            ThreePointArc((0, 5), (-1.767766953, 5.732233047), (-2.5, 7.5))
            Line((-2.5, 7.5), (-2.5, 3.249615362))
            ThreePointArc((-2.5, 3.249615362), (-1.320336513, 3.881586208), (0, 4.1))
        make_face()
    extrude(amount=BOSS_EXTRUDE3_DEPTH)

    # Sketch13<3> → Boss-Extrude4 (add)
    # profile 1 of 2: a face of its own
    with BuildSketch(Plane.XY.offset(49.40604876)):
        with Locations((0, -7.5)):
            Circle(SKETCH13_3_R)
        with Locations(Location((0, -7.5, 0), (0, 0, 180))):
            Circle(SKETCH13_3_R_2, mode=Mode.SUBTRACT)
    # profile 2 of 2: a face of its own
    with BuildSketch(Plane.XY.offset(49.40604876)):
        with BuildLine():
            ThreePointArc((-2.5, -7.5), (-1.767766953, -5.732233047), (0, -5))
            Line((0, -5), (0, -4.1))
            ThreePointArc((0, -4.1), (-1.320336513, -3.881586208), (-2.5, -3.249615362))
            Line((-2.5, -3.249615362), (-2.5, -7.5))
        make_face()
    extrude(amount=BOSS_EXTRUDE4_DEPTH)

    # Sketch13<6> → Cut-Extrude3 (cut)
    # profile 1 of 2: a face of its own
    with BuildSketch(Plane.XY.offset(49.40604876).offset(CUT_EXTRUDE3_START)):
        with BuildLine():
            Line((0, 4.1), (0, 5))
            ThreePointArc((0, 5), (-1.767766953, 5.732233047), (-2.5, 7.5))
            Line((-2.5, 7.5), (-2.5, 3.249615362))
            ThreePointArc((-2.5, 3.249615362), (-1.320336513, 3.881586208), (0, 4.1))
        make_face()
    # profile 2 of 2: a face of its own
    with BuildSketch(Plane.XY.offset(49.40604876).offset(CUT_EXTRUDE3_START)):
        with Locations((0, 7.5)):
            Circle(SKETCH13_6_R)
        with Locations((0, 7.5)):
            Circle(SKETCH13_6_R_2, mode=Mode.SUBTRACT)
    extrude(amount=CUT_EXTRUDE3_DEPTH, mode=Mode.SUBTRACT)

    # Sketch13<7> → Cut-Extrude4 (cut)
    # profile 1 of 2: a face of its own
    with BuildSketch(Plane.XY.offset(49.40604876).offset(CUT_EXTRUDE4_START)):
        with Locations((0, -7.5)):
            Circle(SKETCH13_7_R)
        with Locations(Location((0, -7.5, 0), (0, 0, 180))):
            Circle(SKETCH13_7_R_2, mode=Mode.SUBTRACT)
    # profile 2 of 2: a face of its own
    with BuildSketch(Plane.XY.offset(49.40604876).offset(CUT_EXTRUDE4_START)):
        with BuildLine():
            ThreePointArc((-2.5, -7.5), (-1.767766953, -5.732233047), (0, -5))
            Line((0, -5), (0, -4.1))
            ThreePointArc((0, -4.1), (-1.320336513, -3.881586208), (-2.5, -3.249615362))
            Line((-2.5, -3.249615362), (-2.5, -7.5))
        make_face()
    extrude(amount=CUT_EXTRUDE4_DEPTH, mode=Mode.SUBTRACT)

    # Sketch16 → Boss-Extrude10 (add)
    with BuildSketch(Plane(origin=(0, 0, 0), x_dir=(0, 0, -1), z_dir=(1, 0, 0))):
        with Locations((-49.315467098, -4.514668417)):
            Rectangle(SKETCH16_W, SKETCH16_H)
        with Locations((-49.30604876, 4.509747926)):
            Rectangle(SKETCH16_W_2, SKETCH16_H_2)
    extrude(amount=-BOSS_EXTRUDE10_DEPTH)


solid = part.part
